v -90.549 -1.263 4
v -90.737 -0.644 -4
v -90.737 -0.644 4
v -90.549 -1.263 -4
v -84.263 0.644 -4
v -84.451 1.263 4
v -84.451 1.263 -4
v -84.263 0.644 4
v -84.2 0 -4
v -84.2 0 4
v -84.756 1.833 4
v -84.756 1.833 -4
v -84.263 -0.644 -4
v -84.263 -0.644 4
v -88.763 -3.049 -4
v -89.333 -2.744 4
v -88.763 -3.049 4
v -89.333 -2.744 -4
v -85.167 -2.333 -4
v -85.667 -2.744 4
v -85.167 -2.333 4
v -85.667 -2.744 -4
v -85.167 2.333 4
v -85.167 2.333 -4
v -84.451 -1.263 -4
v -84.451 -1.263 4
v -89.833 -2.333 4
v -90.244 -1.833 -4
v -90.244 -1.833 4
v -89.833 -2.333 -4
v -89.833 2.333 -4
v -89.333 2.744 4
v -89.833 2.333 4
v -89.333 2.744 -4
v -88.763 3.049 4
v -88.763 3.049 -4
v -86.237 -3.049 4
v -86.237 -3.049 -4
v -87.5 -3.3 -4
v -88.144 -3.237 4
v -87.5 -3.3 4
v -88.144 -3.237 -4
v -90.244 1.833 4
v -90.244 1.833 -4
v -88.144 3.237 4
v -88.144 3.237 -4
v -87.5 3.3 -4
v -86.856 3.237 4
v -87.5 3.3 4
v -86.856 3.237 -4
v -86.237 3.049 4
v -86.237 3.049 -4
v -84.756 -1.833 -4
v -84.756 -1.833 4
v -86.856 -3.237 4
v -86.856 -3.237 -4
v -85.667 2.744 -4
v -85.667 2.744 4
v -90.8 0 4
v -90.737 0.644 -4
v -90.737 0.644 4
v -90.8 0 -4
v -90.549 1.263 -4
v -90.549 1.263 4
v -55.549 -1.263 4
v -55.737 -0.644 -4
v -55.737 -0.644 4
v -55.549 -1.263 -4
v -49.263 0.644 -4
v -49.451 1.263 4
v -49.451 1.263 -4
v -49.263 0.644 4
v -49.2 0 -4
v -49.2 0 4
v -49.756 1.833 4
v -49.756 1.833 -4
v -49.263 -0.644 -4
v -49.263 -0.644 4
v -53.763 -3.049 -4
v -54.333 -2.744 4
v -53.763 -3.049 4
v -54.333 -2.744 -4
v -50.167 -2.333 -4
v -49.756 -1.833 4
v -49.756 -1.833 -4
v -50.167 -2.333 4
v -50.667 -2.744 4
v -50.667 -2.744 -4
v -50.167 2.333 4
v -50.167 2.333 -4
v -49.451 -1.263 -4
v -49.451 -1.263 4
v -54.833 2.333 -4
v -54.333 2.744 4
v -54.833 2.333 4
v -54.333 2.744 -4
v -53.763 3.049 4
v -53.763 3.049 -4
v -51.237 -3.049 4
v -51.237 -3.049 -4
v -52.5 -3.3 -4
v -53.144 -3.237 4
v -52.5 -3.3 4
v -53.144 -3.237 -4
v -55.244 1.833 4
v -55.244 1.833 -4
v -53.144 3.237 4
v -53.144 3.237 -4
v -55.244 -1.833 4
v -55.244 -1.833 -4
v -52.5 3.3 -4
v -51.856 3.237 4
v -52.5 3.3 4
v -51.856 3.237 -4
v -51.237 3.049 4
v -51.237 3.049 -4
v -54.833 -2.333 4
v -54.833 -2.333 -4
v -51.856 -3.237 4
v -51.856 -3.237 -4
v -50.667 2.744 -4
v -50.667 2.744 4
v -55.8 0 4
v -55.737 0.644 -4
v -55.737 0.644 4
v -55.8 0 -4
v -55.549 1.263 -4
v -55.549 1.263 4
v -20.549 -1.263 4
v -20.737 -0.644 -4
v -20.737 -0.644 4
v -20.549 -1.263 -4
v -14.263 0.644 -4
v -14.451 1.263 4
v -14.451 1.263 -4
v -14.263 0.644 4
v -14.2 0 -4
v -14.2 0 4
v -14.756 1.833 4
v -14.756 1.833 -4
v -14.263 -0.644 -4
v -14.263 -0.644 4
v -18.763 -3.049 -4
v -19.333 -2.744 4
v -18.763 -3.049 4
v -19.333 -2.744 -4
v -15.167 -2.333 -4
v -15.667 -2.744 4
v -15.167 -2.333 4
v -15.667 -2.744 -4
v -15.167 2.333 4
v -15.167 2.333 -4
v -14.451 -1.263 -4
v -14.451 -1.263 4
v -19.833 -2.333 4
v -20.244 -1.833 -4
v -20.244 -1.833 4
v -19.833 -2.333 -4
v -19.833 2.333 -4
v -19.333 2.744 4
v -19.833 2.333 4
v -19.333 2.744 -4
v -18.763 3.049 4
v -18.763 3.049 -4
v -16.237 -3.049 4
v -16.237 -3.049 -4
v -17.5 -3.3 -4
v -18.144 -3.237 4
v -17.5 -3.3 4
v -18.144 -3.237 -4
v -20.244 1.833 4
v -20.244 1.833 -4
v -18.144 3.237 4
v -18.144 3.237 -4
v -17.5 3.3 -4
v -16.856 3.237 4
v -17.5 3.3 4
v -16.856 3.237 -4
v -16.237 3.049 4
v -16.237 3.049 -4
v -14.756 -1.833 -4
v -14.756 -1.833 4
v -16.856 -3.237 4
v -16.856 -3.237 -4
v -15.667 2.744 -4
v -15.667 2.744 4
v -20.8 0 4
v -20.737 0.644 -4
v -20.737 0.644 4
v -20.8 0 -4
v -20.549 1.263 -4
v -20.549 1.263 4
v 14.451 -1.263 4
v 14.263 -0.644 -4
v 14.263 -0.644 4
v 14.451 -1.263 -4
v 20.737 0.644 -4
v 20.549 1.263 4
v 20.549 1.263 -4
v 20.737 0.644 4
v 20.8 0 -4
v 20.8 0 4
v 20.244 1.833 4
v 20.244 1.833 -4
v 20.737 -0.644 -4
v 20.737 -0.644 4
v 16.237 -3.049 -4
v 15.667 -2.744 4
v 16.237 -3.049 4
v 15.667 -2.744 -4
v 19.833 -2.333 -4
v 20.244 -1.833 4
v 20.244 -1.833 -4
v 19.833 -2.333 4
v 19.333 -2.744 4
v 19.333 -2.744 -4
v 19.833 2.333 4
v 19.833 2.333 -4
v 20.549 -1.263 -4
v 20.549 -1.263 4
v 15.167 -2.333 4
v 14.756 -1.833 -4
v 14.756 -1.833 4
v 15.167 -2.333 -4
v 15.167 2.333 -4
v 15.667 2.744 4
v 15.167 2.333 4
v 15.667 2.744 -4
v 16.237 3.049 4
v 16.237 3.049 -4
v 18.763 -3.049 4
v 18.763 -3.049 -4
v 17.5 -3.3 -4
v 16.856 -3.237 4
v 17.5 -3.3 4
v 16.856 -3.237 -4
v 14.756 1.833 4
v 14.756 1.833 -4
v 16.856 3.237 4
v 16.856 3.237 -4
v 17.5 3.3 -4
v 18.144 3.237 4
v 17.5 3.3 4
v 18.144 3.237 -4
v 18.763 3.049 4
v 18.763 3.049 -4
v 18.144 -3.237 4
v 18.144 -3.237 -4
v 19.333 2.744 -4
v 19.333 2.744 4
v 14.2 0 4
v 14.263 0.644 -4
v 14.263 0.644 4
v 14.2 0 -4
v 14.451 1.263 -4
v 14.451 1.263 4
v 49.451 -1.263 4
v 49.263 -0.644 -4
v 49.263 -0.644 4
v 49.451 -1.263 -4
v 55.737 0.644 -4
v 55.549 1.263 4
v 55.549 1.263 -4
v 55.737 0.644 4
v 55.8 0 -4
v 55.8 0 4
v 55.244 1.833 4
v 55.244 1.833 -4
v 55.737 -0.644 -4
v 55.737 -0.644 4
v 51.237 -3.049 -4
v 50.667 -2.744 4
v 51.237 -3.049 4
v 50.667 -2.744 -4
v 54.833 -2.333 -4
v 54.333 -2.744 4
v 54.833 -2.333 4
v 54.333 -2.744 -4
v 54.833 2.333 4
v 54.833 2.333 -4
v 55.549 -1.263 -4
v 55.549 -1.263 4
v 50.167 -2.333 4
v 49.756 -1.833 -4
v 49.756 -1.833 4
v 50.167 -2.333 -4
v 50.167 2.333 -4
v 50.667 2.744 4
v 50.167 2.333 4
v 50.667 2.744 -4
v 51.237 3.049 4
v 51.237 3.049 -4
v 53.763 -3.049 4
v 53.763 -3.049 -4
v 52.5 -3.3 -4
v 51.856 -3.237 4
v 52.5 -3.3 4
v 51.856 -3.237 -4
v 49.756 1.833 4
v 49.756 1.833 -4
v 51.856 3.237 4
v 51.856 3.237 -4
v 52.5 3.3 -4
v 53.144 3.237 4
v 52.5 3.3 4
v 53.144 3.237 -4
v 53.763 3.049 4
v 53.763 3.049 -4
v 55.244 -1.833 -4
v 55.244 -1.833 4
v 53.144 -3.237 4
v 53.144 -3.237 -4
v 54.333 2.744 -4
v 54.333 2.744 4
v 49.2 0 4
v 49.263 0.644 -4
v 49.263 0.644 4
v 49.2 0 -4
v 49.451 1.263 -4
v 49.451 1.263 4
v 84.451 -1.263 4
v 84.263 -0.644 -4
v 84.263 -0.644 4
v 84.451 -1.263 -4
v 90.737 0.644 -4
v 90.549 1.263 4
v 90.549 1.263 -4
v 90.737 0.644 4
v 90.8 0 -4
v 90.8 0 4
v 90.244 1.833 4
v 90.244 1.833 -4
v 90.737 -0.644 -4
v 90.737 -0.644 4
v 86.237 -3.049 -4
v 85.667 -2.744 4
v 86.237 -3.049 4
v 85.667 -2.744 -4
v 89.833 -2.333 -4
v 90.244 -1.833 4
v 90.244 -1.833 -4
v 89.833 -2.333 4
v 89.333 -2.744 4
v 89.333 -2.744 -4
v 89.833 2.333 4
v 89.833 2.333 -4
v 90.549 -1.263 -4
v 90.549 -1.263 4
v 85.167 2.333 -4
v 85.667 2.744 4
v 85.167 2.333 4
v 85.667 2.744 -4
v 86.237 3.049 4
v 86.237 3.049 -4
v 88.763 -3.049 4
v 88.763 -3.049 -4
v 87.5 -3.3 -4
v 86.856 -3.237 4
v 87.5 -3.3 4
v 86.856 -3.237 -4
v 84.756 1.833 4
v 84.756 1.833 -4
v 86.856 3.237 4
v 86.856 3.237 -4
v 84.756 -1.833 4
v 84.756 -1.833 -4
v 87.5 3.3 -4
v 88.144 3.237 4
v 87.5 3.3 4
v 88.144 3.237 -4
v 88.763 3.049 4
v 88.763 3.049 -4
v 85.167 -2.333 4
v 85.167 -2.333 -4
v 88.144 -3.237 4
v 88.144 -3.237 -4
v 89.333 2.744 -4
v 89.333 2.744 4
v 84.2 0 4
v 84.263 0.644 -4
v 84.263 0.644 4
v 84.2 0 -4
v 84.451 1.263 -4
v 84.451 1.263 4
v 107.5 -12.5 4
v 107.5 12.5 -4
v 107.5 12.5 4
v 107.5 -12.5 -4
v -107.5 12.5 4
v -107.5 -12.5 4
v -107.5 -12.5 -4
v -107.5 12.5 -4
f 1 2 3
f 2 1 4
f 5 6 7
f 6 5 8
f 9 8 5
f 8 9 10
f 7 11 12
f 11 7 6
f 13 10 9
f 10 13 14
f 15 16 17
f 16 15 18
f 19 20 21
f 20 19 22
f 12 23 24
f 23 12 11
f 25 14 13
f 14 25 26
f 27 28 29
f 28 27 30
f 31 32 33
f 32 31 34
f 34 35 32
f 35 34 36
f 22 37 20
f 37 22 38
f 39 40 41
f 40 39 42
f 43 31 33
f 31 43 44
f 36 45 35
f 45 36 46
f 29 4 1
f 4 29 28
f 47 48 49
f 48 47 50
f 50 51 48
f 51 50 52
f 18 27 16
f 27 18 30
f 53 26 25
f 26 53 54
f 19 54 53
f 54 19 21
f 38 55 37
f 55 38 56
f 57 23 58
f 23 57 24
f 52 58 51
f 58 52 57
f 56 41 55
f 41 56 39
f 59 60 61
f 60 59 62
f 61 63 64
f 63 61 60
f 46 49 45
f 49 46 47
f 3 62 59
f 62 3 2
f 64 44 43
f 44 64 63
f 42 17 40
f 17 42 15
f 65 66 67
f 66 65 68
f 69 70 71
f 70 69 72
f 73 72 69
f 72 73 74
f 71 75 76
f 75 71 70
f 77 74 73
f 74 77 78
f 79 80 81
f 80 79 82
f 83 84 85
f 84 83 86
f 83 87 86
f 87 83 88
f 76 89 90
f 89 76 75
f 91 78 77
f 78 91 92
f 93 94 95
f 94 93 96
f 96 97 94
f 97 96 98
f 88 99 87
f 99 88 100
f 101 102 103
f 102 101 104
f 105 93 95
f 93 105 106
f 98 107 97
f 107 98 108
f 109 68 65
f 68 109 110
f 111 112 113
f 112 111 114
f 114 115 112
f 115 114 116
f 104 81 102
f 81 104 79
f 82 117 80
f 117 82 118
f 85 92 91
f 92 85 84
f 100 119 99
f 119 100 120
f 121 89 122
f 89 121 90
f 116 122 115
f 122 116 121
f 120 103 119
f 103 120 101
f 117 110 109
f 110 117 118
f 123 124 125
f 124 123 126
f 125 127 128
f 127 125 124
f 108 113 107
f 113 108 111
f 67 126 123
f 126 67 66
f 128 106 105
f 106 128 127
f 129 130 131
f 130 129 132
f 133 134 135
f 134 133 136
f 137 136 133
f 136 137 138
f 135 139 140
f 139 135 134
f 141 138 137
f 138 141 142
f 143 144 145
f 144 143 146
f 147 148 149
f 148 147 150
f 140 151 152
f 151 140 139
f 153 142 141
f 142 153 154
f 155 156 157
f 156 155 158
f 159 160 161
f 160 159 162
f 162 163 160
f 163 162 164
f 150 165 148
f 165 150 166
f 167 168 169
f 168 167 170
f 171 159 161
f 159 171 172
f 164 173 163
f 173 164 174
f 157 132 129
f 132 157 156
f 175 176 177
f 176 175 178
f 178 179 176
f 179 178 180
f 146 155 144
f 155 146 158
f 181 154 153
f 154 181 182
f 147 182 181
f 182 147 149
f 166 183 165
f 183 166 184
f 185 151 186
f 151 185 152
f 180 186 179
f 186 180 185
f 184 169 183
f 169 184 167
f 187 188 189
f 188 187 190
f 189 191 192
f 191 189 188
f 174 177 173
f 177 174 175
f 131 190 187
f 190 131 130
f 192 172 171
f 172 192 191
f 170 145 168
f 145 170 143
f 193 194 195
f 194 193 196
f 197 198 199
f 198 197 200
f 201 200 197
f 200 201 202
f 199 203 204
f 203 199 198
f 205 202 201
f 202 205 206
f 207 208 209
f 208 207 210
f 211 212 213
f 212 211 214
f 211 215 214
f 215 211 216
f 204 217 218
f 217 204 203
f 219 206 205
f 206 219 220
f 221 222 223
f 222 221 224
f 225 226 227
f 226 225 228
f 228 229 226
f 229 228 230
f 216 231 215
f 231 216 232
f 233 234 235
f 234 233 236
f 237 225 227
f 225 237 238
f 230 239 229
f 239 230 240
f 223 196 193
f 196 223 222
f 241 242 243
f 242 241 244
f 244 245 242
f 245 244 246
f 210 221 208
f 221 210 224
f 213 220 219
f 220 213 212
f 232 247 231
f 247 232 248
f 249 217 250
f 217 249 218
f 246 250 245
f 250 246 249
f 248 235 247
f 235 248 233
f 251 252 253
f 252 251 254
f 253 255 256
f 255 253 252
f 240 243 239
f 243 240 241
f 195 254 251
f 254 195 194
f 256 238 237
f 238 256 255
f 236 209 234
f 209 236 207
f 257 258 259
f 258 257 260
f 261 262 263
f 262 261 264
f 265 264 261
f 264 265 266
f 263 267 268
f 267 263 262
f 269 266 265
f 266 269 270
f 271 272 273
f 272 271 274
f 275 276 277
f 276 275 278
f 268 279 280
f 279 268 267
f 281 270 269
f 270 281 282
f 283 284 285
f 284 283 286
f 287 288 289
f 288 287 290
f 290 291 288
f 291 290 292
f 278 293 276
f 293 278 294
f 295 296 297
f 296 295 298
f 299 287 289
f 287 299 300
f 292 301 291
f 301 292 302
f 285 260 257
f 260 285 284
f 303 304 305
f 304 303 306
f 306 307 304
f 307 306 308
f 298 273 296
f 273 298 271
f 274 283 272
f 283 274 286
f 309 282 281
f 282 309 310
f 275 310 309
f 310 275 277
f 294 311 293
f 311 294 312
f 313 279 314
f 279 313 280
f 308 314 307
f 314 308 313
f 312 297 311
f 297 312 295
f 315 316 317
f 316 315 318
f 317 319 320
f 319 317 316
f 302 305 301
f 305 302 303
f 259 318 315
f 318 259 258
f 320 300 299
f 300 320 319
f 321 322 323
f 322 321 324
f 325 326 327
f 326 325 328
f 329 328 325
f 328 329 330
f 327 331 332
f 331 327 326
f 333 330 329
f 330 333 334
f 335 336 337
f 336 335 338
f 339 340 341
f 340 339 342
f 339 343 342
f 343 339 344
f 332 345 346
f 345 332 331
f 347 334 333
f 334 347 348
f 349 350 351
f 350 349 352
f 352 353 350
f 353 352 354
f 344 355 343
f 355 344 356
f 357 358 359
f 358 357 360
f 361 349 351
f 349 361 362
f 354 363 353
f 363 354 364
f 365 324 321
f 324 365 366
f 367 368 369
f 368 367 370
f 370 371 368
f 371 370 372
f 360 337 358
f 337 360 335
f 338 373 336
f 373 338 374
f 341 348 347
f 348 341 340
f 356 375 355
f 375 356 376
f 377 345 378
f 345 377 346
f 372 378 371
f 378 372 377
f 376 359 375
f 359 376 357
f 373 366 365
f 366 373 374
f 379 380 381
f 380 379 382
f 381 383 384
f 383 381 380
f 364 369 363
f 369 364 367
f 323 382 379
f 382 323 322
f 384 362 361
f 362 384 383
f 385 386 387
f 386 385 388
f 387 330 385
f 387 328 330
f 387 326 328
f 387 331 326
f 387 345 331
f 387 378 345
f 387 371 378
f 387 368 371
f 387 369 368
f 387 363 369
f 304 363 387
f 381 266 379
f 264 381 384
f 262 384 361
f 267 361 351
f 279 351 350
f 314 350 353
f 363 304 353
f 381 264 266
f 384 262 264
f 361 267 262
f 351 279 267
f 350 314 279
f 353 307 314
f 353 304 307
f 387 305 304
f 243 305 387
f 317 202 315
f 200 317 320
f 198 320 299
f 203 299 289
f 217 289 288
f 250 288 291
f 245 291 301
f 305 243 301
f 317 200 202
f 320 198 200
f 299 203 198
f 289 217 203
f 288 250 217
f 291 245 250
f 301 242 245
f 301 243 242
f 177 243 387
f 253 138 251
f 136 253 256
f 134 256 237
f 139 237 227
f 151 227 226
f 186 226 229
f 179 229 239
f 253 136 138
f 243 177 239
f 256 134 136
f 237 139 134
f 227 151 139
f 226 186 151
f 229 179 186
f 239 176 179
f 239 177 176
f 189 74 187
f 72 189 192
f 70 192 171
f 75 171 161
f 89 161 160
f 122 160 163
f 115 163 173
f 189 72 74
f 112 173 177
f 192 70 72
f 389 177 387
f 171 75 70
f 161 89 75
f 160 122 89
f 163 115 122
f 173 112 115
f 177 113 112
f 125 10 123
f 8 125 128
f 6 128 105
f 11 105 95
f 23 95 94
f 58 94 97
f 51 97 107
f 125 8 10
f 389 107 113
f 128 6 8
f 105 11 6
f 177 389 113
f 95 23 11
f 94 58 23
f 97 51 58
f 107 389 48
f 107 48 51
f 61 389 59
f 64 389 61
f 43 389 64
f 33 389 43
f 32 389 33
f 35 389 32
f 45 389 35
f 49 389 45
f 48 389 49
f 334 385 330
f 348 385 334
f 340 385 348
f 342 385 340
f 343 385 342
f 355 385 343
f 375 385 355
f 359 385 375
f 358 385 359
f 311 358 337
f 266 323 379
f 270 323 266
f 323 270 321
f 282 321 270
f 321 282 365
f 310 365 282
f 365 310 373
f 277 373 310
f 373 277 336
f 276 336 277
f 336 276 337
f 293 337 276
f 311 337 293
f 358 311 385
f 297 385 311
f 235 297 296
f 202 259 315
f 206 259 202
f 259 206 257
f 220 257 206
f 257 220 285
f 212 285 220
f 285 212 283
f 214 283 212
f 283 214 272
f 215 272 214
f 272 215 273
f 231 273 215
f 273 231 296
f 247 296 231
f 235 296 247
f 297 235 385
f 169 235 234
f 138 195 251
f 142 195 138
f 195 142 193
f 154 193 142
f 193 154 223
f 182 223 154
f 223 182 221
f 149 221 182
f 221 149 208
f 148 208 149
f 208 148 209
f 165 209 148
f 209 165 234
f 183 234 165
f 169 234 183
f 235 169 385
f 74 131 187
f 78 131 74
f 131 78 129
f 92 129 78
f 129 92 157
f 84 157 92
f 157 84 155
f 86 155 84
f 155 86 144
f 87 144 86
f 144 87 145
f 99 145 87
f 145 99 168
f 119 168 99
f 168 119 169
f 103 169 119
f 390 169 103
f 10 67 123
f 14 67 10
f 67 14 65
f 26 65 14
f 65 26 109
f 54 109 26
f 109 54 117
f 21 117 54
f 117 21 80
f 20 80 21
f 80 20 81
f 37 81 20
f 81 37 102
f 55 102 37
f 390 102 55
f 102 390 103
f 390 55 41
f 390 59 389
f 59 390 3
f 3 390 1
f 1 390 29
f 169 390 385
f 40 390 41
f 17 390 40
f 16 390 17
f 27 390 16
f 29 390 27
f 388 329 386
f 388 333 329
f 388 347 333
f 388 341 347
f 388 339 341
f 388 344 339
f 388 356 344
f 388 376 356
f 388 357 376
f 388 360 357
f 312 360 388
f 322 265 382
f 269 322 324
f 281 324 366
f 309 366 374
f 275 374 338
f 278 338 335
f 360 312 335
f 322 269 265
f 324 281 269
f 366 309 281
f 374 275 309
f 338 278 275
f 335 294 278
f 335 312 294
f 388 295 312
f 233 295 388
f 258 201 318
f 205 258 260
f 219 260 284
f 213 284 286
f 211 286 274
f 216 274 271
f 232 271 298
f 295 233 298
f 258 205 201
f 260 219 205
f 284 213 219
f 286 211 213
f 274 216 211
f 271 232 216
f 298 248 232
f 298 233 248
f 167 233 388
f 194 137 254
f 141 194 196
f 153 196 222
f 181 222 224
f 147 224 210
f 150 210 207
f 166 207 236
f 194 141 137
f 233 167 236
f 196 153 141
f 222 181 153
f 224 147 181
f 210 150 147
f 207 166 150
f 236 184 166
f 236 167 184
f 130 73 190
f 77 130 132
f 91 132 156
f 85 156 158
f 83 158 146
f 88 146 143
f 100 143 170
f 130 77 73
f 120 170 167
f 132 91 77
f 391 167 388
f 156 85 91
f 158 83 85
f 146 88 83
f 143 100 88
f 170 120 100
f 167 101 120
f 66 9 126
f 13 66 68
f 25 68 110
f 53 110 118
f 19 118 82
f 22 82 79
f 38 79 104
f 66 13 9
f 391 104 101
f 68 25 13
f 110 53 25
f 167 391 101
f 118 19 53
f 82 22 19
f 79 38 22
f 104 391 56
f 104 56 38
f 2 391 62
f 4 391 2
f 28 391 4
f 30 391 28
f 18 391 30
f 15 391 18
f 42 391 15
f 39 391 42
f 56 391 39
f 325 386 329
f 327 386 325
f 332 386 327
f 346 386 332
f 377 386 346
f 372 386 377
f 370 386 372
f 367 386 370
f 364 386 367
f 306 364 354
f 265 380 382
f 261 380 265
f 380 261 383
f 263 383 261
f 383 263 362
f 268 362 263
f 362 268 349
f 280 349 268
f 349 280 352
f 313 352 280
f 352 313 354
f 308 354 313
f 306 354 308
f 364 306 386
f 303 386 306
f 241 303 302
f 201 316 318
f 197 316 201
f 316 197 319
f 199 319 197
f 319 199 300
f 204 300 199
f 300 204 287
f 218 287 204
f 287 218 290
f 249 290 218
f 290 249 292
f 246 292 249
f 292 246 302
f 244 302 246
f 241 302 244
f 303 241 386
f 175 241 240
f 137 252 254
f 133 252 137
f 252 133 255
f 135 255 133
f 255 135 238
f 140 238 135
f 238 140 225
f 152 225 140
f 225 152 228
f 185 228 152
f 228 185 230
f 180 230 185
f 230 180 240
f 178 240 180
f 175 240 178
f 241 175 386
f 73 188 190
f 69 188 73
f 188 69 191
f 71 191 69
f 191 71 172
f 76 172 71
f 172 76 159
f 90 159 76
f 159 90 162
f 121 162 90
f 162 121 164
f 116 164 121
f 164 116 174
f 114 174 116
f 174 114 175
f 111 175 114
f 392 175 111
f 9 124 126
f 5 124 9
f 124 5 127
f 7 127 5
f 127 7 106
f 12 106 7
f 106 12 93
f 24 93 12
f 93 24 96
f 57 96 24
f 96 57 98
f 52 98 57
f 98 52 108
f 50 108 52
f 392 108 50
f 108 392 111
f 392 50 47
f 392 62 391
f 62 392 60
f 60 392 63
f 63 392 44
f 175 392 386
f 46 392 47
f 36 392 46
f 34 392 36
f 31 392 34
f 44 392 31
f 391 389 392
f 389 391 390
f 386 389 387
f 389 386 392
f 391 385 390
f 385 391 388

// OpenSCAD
$fn = 32;

// ----------------------------------------------------------------------
// Hole bar, 6 x Ø6.6
// skip layout, 20 mm edge offset
// ----------------------------------------------------------------------

// --- parameters (mm) ---
bar_w = 25;         // bar width (Y)
bar_t = 8;          // bar thickness (Z)
holes = 6;          // holes per row
hole_d = 6.6;       // hole diameter
edge = 20;          // offset from the bar end to the first hole
grid_pitch = 17.5;  // grid the bar was laid out on

// --- derived feature positions (mm) ---
pitch = grid_pitch * 2;       // = 35   holes sit every other grid slot
span = (holes - 1) * pitch;   // = 175   distance between the end holes
bar_l = span + 2 * edge;      // = 215   overall bar length
start_x = -bar_l / 2 + edge;  // = -87.5   X of the first hole
feature_centers = [
  [start_x + 0 * pitch, 0],
  [start_x + 1 * pitch, 0],
  [start_x + 2 * pitch, 0],
  [start_x + 3 * pitch, 0],
  [start_x + 4 * pitch, 0],
  [start_x + 5 * pitch, 0]
];   // hole centres of the first row

// bar with one row of holes, drilled from feature_centers
difference() {
  translate([-bar_l / 2, -bar_w / 2, -bar_t / 2]) cube([bar_l, bar_w, bar_t]);
  for (centre = feature_centers)
    translate([centre[0], centre[1], 0])
      cylinder(d = hole_d, h = bar_t + 2, center = true);
}
